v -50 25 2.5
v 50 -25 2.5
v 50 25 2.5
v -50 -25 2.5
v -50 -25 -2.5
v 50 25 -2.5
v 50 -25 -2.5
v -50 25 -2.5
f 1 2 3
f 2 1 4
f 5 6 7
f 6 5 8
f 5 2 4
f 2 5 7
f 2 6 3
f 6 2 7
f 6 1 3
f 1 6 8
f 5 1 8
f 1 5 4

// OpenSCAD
// Rectangular sheet (single connected solid)

length = 100;   // X
width  = 50;    // Y
thickness = 5;  // Z

module sheet_body(l=length, w=width, t=thickness) {
    // Clamp to a small positive thickness to avoid empty/blank renders
    t2 = (t > 0) ? t : 0.1;
    cube([l, w, t2], center=true);
}

sheet_body();
